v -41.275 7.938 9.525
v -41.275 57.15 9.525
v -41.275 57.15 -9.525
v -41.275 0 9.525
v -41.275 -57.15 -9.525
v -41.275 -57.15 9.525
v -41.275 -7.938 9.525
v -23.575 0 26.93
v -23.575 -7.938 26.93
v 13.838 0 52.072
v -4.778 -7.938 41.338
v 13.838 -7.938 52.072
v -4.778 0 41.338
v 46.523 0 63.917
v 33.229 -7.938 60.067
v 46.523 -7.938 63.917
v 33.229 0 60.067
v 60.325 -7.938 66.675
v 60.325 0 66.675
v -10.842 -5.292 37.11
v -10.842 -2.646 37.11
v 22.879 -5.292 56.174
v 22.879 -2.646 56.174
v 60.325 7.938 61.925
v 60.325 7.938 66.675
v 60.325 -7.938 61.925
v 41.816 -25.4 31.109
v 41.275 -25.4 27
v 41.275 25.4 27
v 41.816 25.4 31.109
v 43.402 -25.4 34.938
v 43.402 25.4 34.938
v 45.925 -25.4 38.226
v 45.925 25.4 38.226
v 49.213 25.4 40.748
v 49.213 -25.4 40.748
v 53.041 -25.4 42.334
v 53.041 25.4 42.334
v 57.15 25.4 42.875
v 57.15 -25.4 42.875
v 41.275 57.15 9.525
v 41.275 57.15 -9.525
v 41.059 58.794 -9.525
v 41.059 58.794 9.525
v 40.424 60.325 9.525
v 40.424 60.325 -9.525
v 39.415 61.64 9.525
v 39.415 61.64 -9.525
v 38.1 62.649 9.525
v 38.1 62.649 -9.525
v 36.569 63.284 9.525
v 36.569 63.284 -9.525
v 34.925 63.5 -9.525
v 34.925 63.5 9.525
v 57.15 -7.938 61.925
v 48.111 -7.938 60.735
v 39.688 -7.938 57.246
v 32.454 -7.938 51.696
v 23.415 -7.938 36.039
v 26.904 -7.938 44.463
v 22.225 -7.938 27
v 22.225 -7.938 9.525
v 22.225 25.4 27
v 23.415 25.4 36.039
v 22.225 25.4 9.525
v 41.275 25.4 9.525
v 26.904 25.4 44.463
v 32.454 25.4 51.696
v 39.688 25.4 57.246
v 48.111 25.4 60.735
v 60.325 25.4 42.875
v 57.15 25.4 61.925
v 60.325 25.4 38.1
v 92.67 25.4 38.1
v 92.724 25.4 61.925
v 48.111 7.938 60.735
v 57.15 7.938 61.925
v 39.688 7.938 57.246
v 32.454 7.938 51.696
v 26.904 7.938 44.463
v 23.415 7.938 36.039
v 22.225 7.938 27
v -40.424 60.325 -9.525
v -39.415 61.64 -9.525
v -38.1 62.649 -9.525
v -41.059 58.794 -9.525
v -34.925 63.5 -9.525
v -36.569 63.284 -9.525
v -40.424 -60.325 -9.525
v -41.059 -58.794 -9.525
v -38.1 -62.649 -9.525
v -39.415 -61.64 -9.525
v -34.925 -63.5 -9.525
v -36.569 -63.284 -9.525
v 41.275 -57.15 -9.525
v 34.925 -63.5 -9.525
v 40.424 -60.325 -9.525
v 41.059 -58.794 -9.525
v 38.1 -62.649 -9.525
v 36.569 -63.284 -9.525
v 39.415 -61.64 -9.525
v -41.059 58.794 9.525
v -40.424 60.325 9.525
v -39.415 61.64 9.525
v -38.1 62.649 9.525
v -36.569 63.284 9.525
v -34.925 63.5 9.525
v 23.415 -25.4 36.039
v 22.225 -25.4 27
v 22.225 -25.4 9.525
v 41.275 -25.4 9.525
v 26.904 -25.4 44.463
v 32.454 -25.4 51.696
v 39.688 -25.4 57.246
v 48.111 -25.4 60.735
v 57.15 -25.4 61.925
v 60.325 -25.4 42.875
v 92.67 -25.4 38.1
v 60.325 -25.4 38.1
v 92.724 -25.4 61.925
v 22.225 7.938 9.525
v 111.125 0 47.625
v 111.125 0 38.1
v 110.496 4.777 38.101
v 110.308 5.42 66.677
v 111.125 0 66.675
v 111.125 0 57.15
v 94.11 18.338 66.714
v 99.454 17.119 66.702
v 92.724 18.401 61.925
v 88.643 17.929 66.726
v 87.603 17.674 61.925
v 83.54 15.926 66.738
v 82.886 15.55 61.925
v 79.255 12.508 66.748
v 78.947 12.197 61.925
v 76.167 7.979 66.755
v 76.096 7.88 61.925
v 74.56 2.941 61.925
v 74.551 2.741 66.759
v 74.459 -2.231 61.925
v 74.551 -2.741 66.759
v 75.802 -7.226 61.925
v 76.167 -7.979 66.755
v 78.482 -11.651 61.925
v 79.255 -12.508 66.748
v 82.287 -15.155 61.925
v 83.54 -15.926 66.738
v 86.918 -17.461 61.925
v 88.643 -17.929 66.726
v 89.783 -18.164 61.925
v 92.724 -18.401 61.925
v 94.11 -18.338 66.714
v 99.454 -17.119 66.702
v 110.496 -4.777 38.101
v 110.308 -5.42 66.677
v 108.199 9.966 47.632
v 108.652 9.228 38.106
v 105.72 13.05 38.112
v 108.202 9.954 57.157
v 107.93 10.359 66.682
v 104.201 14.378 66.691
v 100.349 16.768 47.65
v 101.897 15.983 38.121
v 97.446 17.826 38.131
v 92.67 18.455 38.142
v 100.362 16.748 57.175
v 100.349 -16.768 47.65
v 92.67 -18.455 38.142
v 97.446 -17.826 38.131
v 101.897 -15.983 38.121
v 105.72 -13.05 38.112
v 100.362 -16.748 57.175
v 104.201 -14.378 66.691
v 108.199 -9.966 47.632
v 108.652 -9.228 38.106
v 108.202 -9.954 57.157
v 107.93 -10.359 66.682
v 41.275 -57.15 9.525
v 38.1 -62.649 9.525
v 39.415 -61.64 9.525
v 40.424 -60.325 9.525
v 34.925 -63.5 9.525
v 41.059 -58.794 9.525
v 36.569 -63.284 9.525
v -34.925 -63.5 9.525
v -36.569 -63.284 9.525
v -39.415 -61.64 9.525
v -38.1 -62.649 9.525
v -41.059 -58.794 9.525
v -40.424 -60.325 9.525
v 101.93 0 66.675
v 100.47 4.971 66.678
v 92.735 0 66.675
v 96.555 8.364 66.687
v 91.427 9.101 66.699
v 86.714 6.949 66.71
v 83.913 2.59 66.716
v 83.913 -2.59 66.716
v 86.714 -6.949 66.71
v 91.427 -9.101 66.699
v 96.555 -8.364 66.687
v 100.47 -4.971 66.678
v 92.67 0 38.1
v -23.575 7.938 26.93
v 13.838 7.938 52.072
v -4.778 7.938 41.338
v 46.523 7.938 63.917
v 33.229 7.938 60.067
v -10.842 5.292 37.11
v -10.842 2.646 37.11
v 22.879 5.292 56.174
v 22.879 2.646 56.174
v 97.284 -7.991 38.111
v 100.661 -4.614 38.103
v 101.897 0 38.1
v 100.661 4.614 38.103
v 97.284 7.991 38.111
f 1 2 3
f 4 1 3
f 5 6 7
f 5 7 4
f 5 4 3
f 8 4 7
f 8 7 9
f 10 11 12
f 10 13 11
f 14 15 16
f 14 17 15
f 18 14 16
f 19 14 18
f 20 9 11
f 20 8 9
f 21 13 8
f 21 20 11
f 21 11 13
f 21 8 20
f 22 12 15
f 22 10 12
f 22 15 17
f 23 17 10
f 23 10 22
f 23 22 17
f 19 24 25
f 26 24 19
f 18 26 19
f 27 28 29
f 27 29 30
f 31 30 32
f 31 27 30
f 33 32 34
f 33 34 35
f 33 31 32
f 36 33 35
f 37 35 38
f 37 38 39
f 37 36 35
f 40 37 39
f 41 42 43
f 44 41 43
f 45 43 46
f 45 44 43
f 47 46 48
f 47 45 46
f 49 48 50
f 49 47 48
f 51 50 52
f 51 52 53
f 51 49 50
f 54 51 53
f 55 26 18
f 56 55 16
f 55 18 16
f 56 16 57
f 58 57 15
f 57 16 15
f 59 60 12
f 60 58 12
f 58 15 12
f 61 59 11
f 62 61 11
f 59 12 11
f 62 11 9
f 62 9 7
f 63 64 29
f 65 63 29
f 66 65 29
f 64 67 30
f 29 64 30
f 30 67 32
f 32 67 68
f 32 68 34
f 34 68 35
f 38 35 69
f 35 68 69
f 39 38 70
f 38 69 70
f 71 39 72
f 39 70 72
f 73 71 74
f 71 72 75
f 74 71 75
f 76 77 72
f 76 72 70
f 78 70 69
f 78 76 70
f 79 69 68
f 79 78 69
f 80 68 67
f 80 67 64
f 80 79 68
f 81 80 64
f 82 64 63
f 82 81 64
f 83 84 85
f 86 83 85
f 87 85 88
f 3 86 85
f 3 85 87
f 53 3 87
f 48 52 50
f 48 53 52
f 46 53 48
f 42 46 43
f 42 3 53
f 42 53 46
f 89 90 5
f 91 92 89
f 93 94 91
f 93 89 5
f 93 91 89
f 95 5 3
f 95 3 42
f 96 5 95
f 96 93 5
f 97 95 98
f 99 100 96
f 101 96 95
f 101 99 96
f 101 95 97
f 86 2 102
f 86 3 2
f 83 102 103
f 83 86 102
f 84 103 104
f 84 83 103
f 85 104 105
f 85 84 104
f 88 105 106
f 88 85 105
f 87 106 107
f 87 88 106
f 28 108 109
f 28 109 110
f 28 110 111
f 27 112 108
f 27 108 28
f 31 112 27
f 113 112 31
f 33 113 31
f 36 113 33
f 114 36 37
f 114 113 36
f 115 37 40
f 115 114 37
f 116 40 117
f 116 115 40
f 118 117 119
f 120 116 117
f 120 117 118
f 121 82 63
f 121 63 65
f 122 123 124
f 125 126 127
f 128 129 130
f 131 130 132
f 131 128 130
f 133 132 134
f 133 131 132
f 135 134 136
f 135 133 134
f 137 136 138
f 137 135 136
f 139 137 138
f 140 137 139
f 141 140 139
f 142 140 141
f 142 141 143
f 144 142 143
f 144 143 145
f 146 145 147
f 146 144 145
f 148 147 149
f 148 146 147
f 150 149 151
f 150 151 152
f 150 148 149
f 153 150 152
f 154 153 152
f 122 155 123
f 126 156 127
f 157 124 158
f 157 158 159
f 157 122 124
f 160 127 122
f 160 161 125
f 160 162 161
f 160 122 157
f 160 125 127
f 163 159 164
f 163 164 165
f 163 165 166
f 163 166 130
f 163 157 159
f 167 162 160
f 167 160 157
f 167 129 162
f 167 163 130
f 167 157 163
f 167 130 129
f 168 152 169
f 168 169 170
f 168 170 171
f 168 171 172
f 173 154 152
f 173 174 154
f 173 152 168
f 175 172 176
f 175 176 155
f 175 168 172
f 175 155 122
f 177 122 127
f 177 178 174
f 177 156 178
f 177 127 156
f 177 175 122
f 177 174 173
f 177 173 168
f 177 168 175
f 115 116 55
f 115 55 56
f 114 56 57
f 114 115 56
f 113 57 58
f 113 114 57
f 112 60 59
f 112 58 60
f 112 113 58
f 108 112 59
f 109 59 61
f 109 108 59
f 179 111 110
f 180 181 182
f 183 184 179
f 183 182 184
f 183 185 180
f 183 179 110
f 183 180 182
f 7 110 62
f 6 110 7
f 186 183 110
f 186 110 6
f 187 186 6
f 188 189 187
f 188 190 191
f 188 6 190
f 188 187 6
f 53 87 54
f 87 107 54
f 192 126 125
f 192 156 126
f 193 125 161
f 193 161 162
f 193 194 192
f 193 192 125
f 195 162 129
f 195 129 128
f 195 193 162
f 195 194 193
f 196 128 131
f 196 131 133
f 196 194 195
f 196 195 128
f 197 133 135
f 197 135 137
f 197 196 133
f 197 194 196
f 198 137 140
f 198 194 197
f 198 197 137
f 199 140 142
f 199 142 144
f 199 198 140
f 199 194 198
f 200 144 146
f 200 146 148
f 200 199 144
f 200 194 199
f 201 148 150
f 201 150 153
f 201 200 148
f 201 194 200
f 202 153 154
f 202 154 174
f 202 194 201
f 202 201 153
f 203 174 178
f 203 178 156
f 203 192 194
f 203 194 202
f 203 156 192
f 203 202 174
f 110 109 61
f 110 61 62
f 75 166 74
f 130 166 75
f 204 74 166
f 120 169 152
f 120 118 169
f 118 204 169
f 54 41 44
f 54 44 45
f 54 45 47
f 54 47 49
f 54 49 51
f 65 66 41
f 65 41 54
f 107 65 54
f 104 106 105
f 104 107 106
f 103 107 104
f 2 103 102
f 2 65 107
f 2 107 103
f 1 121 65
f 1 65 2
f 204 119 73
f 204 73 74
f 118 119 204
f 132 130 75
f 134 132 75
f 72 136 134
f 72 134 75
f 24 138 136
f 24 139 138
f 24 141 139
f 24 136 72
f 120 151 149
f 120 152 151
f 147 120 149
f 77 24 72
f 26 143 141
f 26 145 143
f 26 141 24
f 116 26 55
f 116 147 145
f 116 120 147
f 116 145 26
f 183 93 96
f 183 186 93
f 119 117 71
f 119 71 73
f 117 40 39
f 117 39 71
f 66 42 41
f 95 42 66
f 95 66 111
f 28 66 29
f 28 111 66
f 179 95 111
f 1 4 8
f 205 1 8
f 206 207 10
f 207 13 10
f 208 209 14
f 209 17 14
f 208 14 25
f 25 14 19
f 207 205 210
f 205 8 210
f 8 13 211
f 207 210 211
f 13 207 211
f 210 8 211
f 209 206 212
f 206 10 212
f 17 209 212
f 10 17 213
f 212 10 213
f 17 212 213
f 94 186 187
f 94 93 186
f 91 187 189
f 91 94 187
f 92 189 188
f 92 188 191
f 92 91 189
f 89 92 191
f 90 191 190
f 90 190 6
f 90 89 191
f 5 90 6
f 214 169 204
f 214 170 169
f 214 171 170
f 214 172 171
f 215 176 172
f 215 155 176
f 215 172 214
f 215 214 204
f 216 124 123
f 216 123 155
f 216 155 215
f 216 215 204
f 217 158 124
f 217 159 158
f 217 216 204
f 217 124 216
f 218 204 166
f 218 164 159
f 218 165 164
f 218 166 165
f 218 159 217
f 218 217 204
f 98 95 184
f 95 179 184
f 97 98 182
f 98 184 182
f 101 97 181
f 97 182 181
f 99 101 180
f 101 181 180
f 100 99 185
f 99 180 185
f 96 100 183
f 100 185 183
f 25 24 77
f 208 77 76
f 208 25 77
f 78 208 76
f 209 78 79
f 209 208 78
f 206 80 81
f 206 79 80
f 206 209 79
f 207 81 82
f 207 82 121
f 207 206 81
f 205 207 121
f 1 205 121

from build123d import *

# Parameters (mm, degrees)
F1_DEPTH = 63.5
F2_DEPTH = 25.4
F3_DEPTH = 7.9375
F4_DEPTH = 25.4
F5_R     = 6.35


with BuildPart() as f1:
    # F0 (on Front) → F1 (new body, symmetric)
    with BuildSketch(Plane.XZ):
        Polygon((-41.275, -9.525), (41.275, -9.525), (41.275, 9.525), (22.225, 9.525), (-41.275, 9.525), align=None)
    extrude(amount=F1_DEPTH, both=True)

    # F0 (on Front) → F2 (join, symmetric)
    with BuildSketch(Plane.XZ):
        with BuildLine():
            Line((22.225, 9.525), (41.275, 9.525))
            Line((41.275, 9.525), (41.275, 27.0002))
            ThreePointArc((41.275, 27.0002), (45.9246798487, 38.2255201513), (57.15, 42.8752))
            Line((57.15, 42.8752), (60.325, 42.8752))
            Line((60.325, 42.8752), (60.325, 61.9252))
            Line((60.325, 61.9252), (57.15, 61.9252))
            ThreePointArc((57.15, 61.9252), (32.4542956671, 51.6959043329), (22.225, 27.0002))
            Line((22.225, 27.0002), (22.225, 9.525))
        make_face()
    extrude(amount=F2_DEPTH, both=True)

    # F0 (on Front) → F3 (join, symmetric)
    with BuildSketch(Plane.XZ):
        with BuildLine():
            add(Edge.make_bspline(
                [(-41.275, 9.525), (-12.3398668578, 41.355177187), (20.8714975106, 60.4699858623), (60.325, 66.675)],
                knots=[0, 0, 0, 0, 116.5705044169, 116.5705044169, 116.5705044169, 116.5705044169], degree=3))
            Line((-41.275, 9.525), (22.225, 9.525))
            Line((22.225, 9.525), (22.225, 27.0002))
            ThreePointArc((22.225, 27.0002), (32.4542956671, 51.6959043329), (57.15, 61.9252))
            Line((57.15, 61.9252), (60.325, 61.9252))
            Line((60.325, 61.9252), (60.325, 66.675))
        make_face()
    extrude(amount=F3_DEPTH, both=True)

    # F0 (on Front) → F4 (join, symmetric)
    with BuildSketch(Plane.XZ):
        Polygon((92.7243528686, 61.9252), (60.325, 61.9252), (60.325, 42.8752), (60.325, 38.1), (92.6698073745, 38.1), align=None)
    extrude(amount=F4_DEPTH, both=True)

    # F5
    f5_edges = [f1.edges().sort_by_distance(p)[0] for p in [
        (-41.275, -63.5, 0),
        (41.275, -63.5, 0),
        (41.275, 63.5, 0),
        (-41.275, 63.5, 0),
    ]]
    fillet(f5_edges, radius=F5_R)

    # F0 (on Front) → F6 (revolve)
    with BuildSketch(Plane.XZ):
        Polygon((111.125, 66.675), (92.7352270769, 66.675), (92.7243528686, 61.9252), (92.6698073745, 38.1), (111.125, 38.1), align=None)
    revolve(axis=Axis((92.7025172257, 0, 52.3875), (0.0022893974, 0, 0.9999973793)))


solid = f1.part
